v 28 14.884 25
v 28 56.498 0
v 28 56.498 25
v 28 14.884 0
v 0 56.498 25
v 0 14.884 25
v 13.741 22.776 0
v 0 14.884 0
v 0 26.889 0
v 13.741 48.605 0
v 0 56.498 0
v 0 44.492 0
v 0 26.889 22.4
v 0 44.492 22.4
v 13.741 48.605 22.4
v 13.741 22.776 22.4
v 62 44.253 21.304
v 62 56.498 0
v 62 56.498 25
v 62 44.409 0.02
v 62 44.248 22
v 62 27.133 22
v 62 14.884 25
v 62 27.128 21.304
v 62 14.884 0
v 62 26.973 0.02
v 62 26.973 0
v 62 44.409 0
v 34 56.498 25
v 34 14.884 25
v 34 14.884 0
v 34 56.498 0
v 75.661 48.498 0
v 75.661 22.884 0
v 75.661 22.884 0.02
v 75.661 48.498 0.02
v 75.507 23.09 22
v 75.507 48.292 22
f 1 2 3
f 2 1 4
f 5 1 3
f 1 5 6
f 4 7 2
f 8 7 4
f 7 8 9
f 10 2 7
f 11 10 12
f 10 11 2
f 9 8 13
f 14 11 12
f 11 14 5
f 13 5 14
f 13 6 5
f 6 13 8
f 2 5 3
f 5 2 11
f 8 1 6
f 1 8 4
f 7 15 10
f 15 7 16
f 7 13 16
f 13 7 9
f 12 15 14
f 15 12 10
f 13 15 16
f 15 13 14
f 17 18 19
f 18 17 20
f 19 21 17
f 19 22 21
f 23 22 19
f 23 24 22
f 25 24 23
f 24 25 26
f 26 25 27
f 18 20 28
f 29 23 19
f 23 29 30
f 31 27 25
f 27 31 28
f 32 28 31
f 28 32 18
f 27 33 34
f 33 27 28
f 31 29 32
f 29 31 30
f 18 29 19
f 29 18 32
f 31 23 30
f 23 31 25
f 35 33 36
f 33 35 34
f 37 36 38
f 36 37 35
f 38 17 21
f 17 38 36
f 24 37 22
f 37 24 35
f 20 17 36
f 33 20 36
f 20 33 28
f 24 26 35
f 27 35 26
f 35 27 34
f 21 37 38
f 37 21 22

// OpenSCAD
// GENERATED by make-makerworld.sh — do not edit, edit the lib/ sources.
// Single-file variant for the MakerWorld Parametric Model Maker.
// Parametric ornate picture frame, segmented for small-bed 3D printing.
//
// The frame is generated around a frameless canvas painting, split into
// one-piece L corners plus straight segments that each fit the selected
// printer bed, joined by glueless press-fit dovetails. The canvas sits fully
// recessed; printed clips hold it and carry the frame off the stretcher.
//
// Print orientation (all parts): decorative face UP, back plane on the bed.
// Suggested slicing: 0.6 mm nozzle, 2 walls, lightning infill, no supports.
//
// Workflow: print fit_test first, tune dovetail_clearance/shrinkage_compensation,
// then export all parts with export-all.sh.

/* [Painting] */
// Painting width (mm)
painting_width = 1300;        // [100:5:3000]
// Painting height (mm)
painting_height = 900;        // [100:5:3000]
// Painting/stretcher thickness (mm)
painting_thickness = 20;      // [5:1:60]
// Slack per side around the canvas (mm) — covers PLA shrinkage over long spans
fit_clearance = 4;            // [0:0.5:10]
// Front lip overlapping the painting face (mm)
lip_overlap = 10;             // [4:1:30]

/* [Frame look] */
// Cross-section style
profile_style = "ogee";       // [ogee, reverse_ogee, ripple]
// Moulding scale, proportional to painting size (1.0 = 5.4% of diagonal)
frame_scale = 1.0;            // [0.5:0.05:2.0]
// Generate relief ornament on the bands
ornament_enable = true;
// Ornament relief height (mm)
ornament_depth = 1.6;         // [0.6:0.2:3]
// Target ornament repeat period (mm)
ornament_period_target = 42;  // [24:2:80]
// Preview color of the frame body (previews only, not exported)
body_color = "#43280f";
// Preview color of the ornament relief (previews only, not exported)
ornament_color = "#d4a843";

/* [Printer / segmentation] */
// Bed preset
printer = "A1 Mini";          // [A1 Mini, A1, P1 X1, H2D]
// Keep-out margin per bed side (mm)
bed_margin = 2.5;             // [0:0.5:10]
// Dovetail clearance per side (mm) — press fit; tune with fit_test
dovetail_clearance = 0.08;    // [0:0.02:0.5]
// Dovetail flank taper (deg) — wedge-locks the glueless joint
dovetail_taper = 0.4;         // [0:0.1:2]
// Uniform XY scale on exported parts (1.003 = +0.3% shrink compensation)
shrinkage_compensation = 1.0; // [0.99:0.001:1.02]

/* [Output] */
render_mode = "fit_test";    // [assembled, exploded, part, fit_test, clips, bom]
// Which kind of part to export (render_mode=part)
part_kind = "straight";       // [straight, corner]
// Leg; a corner is the one at this leg's CCW start: bottom=BL, right=BR, top=TR, left=TL
part_leg = "bottom";          // [bottom, right, top, left]
// Straight segment number along the leg (CCW direction)
part_index = 1;               // [1:1:12]
// Gap between parts in exploded view (mm)
explode_gap = 30;             // [0:5:100]
// Restrict assembled output to one material group (for colored GLB/3MF export)
export_group = "all";         // [all, body, ornament]

/* [Mounting] */
// Canvas recess behind the back plane (mm); also the rabbet depth minus canvas
rabbet_extra = 4;             // [2:1:10]
// Keyhole wall hangers in the two top corners (normally the frame hangs on the stretcher)
hanger_keyholes = false;

/* [Hidden] */
$fa = 5;
$fs = 0.5;          // coarsest acceptable for a 0.4 mm nozzle; we print 0.6
curve_step = 0.8;   // profile sampling step (mm)
orn_embed = 0.6;    // how deep ornament sinks into the band surface (mm)
label_depth = 0.8;  // part ID engraving depth in the back (mm)

// ---- derived dimensions (all mm) ----
sight_w = painting_width - 2 * lip_overlap;
sight_h = painting_height - 2 * lip_overlap;
lip_w = lip_overlap + fit_clearance;
face_w = 0.054 * norm([painting_width, painting_height]) * frame_scale;
rabbet_depth = painting_thickness + rabbet_extra;
profile_h = max(0.45 * face_w, rabbet_depth + 12);
frame_ow = sight_w + 2 * face_w;
frame_oh = sight_h + 2 * face_w;

bed = printer == "A1 Mini" ? [180, 180] :
      printer == "A1"      ? [256, 256] :
      printer == "P1 X1"   ? [256, 256] :
      printer == "H2D"     ? [350, 320] :
      assert(false, str("unknown printer: ", printer)) [0, 0];
usable = min(bed[0], bed[1]) - 2 * bed_margin;

// ---- inlined from lib/profiles.scad ----
// lib/profiles.scad — cross-section (Querschnitt) generators
//
// Coordinates: u = distance from the sight (inner) edge, z = height above the
// back plane. Curves are defined as control point lists [u_frac, z_frac, shape]
// where u_frac is a fraction of face_w, z_frac a fraction of profile_h, and
// shape describes the segment ENDING at that point: 0 = straight line,
// 1 = cosine ease (smooth blend). All slopes stay <= ~50 deg from horizontal so
// the decorative face prints face-up without supports.

function _ease(t) = (1 - cos(180 * t)) / 2;

function prof_curve(style) =
  style == "ogee" ? [
    // sight fillet, inner scallop band, deep cove, grand ogee rise,
    // wide scroll band, groove, outer bead, outer fall
    [0.00, 0.80, 0],
    [0.04, 0.84, 1],
    [0.17, 0.84, 0],
    [0.26, 0.60, 1],
    [0.54, 0.97, 1],
    [0.80, 0.97, 0],
    [0.83, 0.89, 1],
    [0.87, 0.96, 1],
    [0.91, 0.87, 1],
    [1.00, 0.75, 1],
  ] :
  style == "reverse_ogee" ? [
    // high inner crest with band, grand fall outward, low outer scroll band,
    // outer bead
    [0.00, 0.80, 0],
    [0.06, 0.94, 1],
    [0.20, 0.94, 0],
    [0.46, 0.60, 1],
    [0.60, 0.66, 1],
    [0.84, 0.66, 0],
    [0.88, 0.74, 1],
    [0.93, 0.62, 1],
    [1.00, 0.55, 1],
  ] :
  style == "ripple" ? [
    // inner band, three rising ripples (Wellenleiste), outer scroll band, bead
    [0.00, 0.80, 0],
    [0.04, 0.86, 1],
    [0.15, 0.86, 0],
    [0.22, 0.76, 1],
    [0.29, 0.88, 1],
    [0.36, 0.78, 1],
    [0.43, 0.90, 1],
    [0.50, 0.80, 1],
    [0.57, 0.92, 1],
    [0.63, 0.97, 1],
    [0.84, 0.97, 0],
    [0.88, 0.88, 1],
    [0.92, 0.94, 1],
    [1.00, 0.72, 1],
  ] :
  assert(false, str("unknown profile_style: ", style)) [];

// Ornament bands per style: [u_frac_start, u_frac_end, z_frac_surface, kind]
// kind: 0 = running scroll (wide band), 1 = scallop/egg-and-dart (narrow band)
function prof_bands(style) =
  style == "ogee"         ? [[0.54, 0.80, 0.97, 0], [0.04, 0.17, 0.84, 1]] :
  style == "reverse_ogee" ? [[0.60, 0.84, 0.66, 0], [0.06, 0.20, 0.94, 1]] :
                            [[0.63, 0.84, 0.97, 0], [0.04, 0.15, 0.86, 1]];

function _segz(C, s, t) =
  let(z1 = C[s][1], z2 = C[s + 1][1], ty = C[s + 1][2])
  z1 + (z2 - z1) * (ty == 0 ? t : _ease(t));

// z_frac of the top surface at u_frac (clamped to [0,1])
function prof_z(C, uf) =
  let(cl = min(max(uf, 0), 1),
      s = [for (i = [0:len(C) - 2]) if (cl >= C[i][0] && cl <= C[i + 1][0]) i][0],
      t = (cl - C[s][0]) / max(C[s + 1][0] - C[s][0], 1e-9))
  _segz(C, s, t);

// minimum z_frac over [uf1, uf2]
function prof_min_z(C, uf1, uf2, n = 48) =
  min([for (i = [0:n]) prof_z(C, uf1 + (uf2 - uf1) * i / n)]);

// Full closed cross-section polygon in leg-local coordinates:
// x = y_local = face_w - u (outer edge at 0, sight edge at face_w), y = z.
// Includes the rear rabbet notch under the lip.
function leg_xsec_pts(C, fw, H, lipw, rd, step) =
  let(top = [for (s = [0:len(C) - 2]) each
              let(u1 = C[s][0], u2 = C[s + 1][0],
                  n = max(2, ceil((u2 - u1) * fw / step)))
              [for (j = [(s == 0 ? 0 : 1):n])
                let(t = j / n, uf = u1 + (u2 - u1) * t)
                [fw - uf * fw, H * _segz(C, s, t)]]])
  concat([[fw, rd]], top, [[0, 0], [fw - lipw, 0], [fw - lipw, rd]]);

// ---- inlined from lib/segmentation.scad ----
// lib/segmentation.scad — bed-aware cutting math + press-fit dovetail joints
//
// A leg runs along local +X over [0, L]; cut positions are leg-local X values.
// The ornament repeat grid and the cut grid share the same period so every seam
// lands on a motif boundary (pattern valley).

// Even number of ornament periods across the leg, symmetric about its center.
function grid_period(L, target) = L / (2 * max(1, round(L / (2 * target))));

// Cut positions for one leg: [arm_cut_low, internal cuts..., arm_cut_high].
// Corner arms (leg ends outside the outermost cuts) stay attached to the
// one-piece L corners. All cuts are multiples of the ornament period p,
// measured from the leg center. Every straight segment is <= usable.
function cuts_for(L, p, usable) =
  let(target_arm = 0.97 * usable,
      k = ceil((L / 2 - target_arm) / p))
  assert(k >= 1, str("Leg of ", L, " mm fits the bed — segmentation not needed; shrink corner arms or print whole"))
  let(cc = k * p,           // half-run length (distance of arm cuts from center)
      np = 2 * k,           // ornament periods inside the straight run
      mmax = max(1, floor(usable / p)),
      nseg = ceil(np / mmax),
      base = floor(np / nseg),
      extra = np - base * nseg,
      counts = [for (i = [0:nseg - 1])
                 (i < ceil(extra / 2) || i >= nseg - floor(extra / 2)) ? base + 1 : base])
  assert(max(counts) * p <= usable + 1e-6, "internal: segment exceeds bed")
  [for (j = [0:nseg]) L / 2 - cc + p * _psum(counts, j)];

function _psum(v, j) = j <= 0 ? 0 : _psum(v, j - 1) + v[j - 1];

// ---- Dovetail (plan-view trapezoid, vertical drop-in assembly) ----
// The male tenon belongs to the segment on the LOW-x side of a cut and points
// +x into the neighbor's pocket. Assembly: lay parts face-down, drop the tenon
// into the pocket (opening on the back face) and press — the tapered flanks
// wedge-lock. Print orientation: face up; the pocket roof is a small bridge.

function dt_poly(xc) = [
  [xc - 0.6, dt_yc - dt_wn / 2],
  [xc + dt_dl, dt_yc - dt_wh / 2],
  [xc + dt_dl, dt_yc + dt_wh / 2],
  [xc - 0.6, dt_yc + dt_wn / 2],
];

module dt_tenon(xc) {
  hull() {
    linear_extrude(0.02) polygon(dt_poly(xc));
    translate([0, 0, dt_h - 0.02])
      linear_extrude(0.02) offset(delta = -dt_taper_off) polygon(dt_poly(xc));
  }
}

module dt_pocket(xc) {
  color(body_color)  // preview only: difference faces show the subtrahend color
    translate([0, 0, -0.5])
      linear_extrude(dt_h + 0.9, convexity = 4)
        offset(delta = dovetail_clearance) polygon(dt_poly(xc));
}

// ---- inlined from lib/ornament.scad ----
// lib/ornament.scad — mathematically generated relief ornament
//
// Two band motifs, both emitted as single valid polygons (no self-intersection):
//  * running scroll: squashed Archimedean-style spiral r = R*(th/thmax)^k,
//    stroked with a tapering width, alternately rotated 180 deg (Vitruvian wave)
//  * scallop: half-annulus arc + central dart (egg-and-dart flavor)
// Relief height is ornament_depth; minimum stroke width stays >= 1.35 mm so a
// 0.6 mm nozzle (and 0.4 mm for compatibility) can print every ridge.

function _unit(v) = v / max(norm(v), 1e-9);

// stroke a polyline into a closed polygon, width lerping w0 -> w1 along it
function stroke_poly(pts, w0, w1) =
  let(n = len(pts) - 1,
      ts = [for (i = [0:n]) _unit(pts[min(i + 1, n)] - pts[max(i - 1, 0)])],
      ws = [for (i = [0:n]) w0 + (w1 - w0) * i / n],
      lft = [for (i = [0:n]) pts[i] + [-ts[i][1], ts[i][0]] * ws[i] / 2],
      rgt = [for (i = [0:n]) pts[i] - [-ts[i][1], ts[i][0]] * ws[i] / 2])
  concat(lft, [for (i = [n:-1:0]) rgt[i]]);

// spiral polyline from the outer end (theta=thmax) inward to theta=th0
function spiral_pts(R, sy, th0, thmax, kexp, step) =
  [for (th = [thmax:-step:th0])
    let(r = R * pow(th / thmax, kexp)) [r * cos(th), r * sin(th) * sy]];

scroll_w_out = 2.3;  // outer stroke width, mm
scroll_w_in = 1.35;  // stroke width at the spiral tip, mm

// 2D running-scroll motif centered on the origin, one ornament period wide
module scroll_motif(p, bw) {
  R = 0.40 * p;
  sy = min(0.62, (bw / 2 - scroll_w_out / 2 - 0.6) / R);
  pts = spiral_pts(R, sy, 90, 1080, 0.85, 12);
  tip = pts[len(pts) - 1];
  intersection() {
    union() {
      polygon(stroke_poly(pts, scroll_w_out, scroll_w_in));
      translate(tip) circle(d = scroll_w_in * 1.4);
      circle(d = 2.2);  // spiral eye
    }
    square([p - 1.0, bw - 0.4], center = true);
  }
}

// 2D scallop motif: half-annulus + dart, base sitting on the band's inner side
module scallop_motif(p2, bw) {
  R = min(0.44 * p2, 0.85 * bw);
  t = 1.6;
  intersection() {
    translate([0, -bw / 2 + 0.3]) union() {
      polygon(concat(
        [for (a = [0:7.5:180]) R * [cos(a), sin(a)]],
        [for (a = [180:-7.5:0]) (R - t) * [cos(a), sin(a)]]));
      polygon([[-1.0, 0], [1.0, 0], [0, max(R - t - 0.8, 2)]]);
    }
    square([p2 - 0.8, bw - 0.4], center = true);
  }
}

// extruded, cache-friendly motif (identical instances hit the geometry cache)
module motif3d(kind, p, bw) {
  render(convexity = 6)
    linear_extrude(orn_embed + ornament_depth, convexity = 6) {
      if (kind == 0) scroll_motif(p, bw);
      else scallop_motif(p, bw);
    }
}

// all ornament bands along one leg (leg-local coordinates), restricted to
// cells overlapping [x1, x2] — parts only build their own motifs, which keeps
// non-Manifold backends (MakerWorld) within usable render times
module ornament_leg(L, p, x1, x2) {
  n = round(L / p);
  for (b = prof_bands(profile_style)) {
    ybc = face_w - (b[0] + b[1]) / 2 * face_w;
    bw = (b[1] - b[0]) * face_w;
    zb = b[2] * profile_h - orn_embed;
    if (b[3] == 0) {
      for (i = [0:n - 1])
        if ((i + 1) * p >= x1 && i * p <= x2)
          translate([(i + 0.5) * p, ybc, zb])
            rotate([0, 0, i % 2 == 0 ? 0 : 180]) motif3d(0, p, bw);
    } else {
      for (i = [0:2 * n - 1])
        if ((i + 1) * p / 2 >= x1 && i * p / 2 <= x2)
          translate([(i + 0.5) * p / 2, ybc, zb]) motif3d(1, p / 2, bw);
    }
  }
}

// ---- inlined from lib/clips.scad ----
// lib/clips.scad — canvas retainer clips + their cavities in the frame back
//
// The canvas sits fully recessed in the rabbet pocket; its back face lies
// rabbet_extra mm in front of the frame's back plane. Each clip lies in a
// clip_pocket_d deep recess in the back plane (so clip + M3 screw head end up
// sub-flush — the back stays wall-flush) and its raised nose presses the
// stretcher. Load path: frame -> clips -> stretcher -> existing wall screws.
// Print orientation: flat on its back, nose step up. No supports.

clip_w = 12;          // clip width, mm
clip_t = 3;           // clip bar thickness, mm
clip_tail = 14;       // screw-side tail length, mm
clip_body = 8;        // body between hole and pocket wall, mm
clip_nose = 8;        // nose overlap onto the stretcher, mm
clip_pocket_d = 3.5;  // recess depth in the frame back, mm
clip_pocket_w = clip_w + 2;
clip_pocket_len = clip_tail + clip_body;
clip_hole_d = 3.4;    // M3 through-hole in the clip, mm
clip_pilot_d = 2.7;   // M3 self-tap pilot in the frame, mm

// standalone clip part, printed flat (z=0 on the bed)
module clip() {
  nose_rise = rabbet_extra - clip_pocket_d;
  assert(nose_rise >= 0, "rabbet_extra must be >= clip_pocket_d");
  difference() {
    union() {
      cube([clip_pocket_len, clip_w, clip_t]);
      translate([clip_pocket_len - 0.1, 0, nose_rise])
        cube([clip_nose + 0.1, clip_w, clip_t]);
    }
    translate([clip_tail / 2, clip_w / 2, -1])
      cylinder(d = clip_hole_d, h = clip_t + rabbet_extra + 2);
  }
}

// recess + pilot hole, subtracted from a leg at leg-local x
module clip_cavity(x) color(body_color) {
  y1 = face_w - lip_w - clip_pocket_len;
  translate([x - clip_pocket_w / 2, y1, -0.1])
    cube([clip_pocket_w, clip_pocket_len + 2, clip_pocket_d + 0.1]);
  translate([x, y1 + clip_tail / 2, -1])
    cylinder(d = clip_pilot_d, h = clip_pocket_d + 11);
}

// all clips as one print plate
module clips_plate(n) {
  cols = 2;
  for (i = [0:n - 1])
    translate([(i % cols) * (clip_pocket_len + clip_nose + 8), floor(i / cols) * (clip_w + 5), 0])
      clip();
}


PC = prof_curve(profile_style);

// dovetail geometry, centered on the solid body between rabbet wall and outer edge
dt_yc = (face_w - lip_w) / 2;
dt_wn = 0.20 * face_w;
dt_wh = 0.30 * face_w;
dt_dl = 0.16 * face_w;
dt_h = min(rabbet_depth - 2,
           profile_h * prof_min_z(PC,
             (face_w - (dt_yc + dt_wh / 2 + 2)) / face_w,
             (face_w - (dt_yc - dt_wh / 2 - 2)) / face_w) - 2.9);
dt_taper_off = tan(dovetail_taper) * dt_h;

// segmentation grids (horizontal legs: bottom/top; vertical legs: left/right).
// Every part carries its male tenon dt_dl beyond the cut — the FULL part
// including the tenon must fit the bed, so the segment budget shrinks by dt_dl.
usable_part = usable - dt_dl;
p_h = grid_period(frame_ow, ornament_period_target);
p_v = grid_period(frame_oh, ornament_period_target);
cuts_h = cuts_for(frame_ow, p_h, usable_part);
cuts_v = cuts_for(frame_oh, p_v, usable_part);
nseg_h = len(cuts_h) - 1;
nseg_v = len(cuts_v) - 1;
arm_h = cuts_h[0];
arm_v = cuts_v[0];

// ---- sanity checks ----
assert(face_w <= usable, "moulding wider than the printer bed — reduce frame_scale");
assert(profile_h * prof_min_z(PC, 0, lip_w / face_w) >= rabbet_depth + 5,
       "lip too thin over the rabbet — raise frame_scale or lower rabbet_extra");
assert(dt_h >= 8, "dovetail too shallow — raise frame_scale");
// bed-fit including the protruding tenon (a part's true bounding box)
assert(max([for (i = [1:nseg_h]) cuts_h[i] - cuts_h[i - 1]]) + dt_dl <= usable,
       "segment + tenon exceeds bed");
assert(max([for (i = [1:nseg_v]) cuts_v[i] - cuts_v[i - 1]]) + dt_dl <= usable,
       "segment + tenon exceeds bed");
assert(max(arm_h, arm_v) + dt_dl <= usable, "corner + tenon exceeds bed");
assert(scroll_w_in >= 1.3, "ornament stroke below printable width");
assert(part_index >= 1, "part_index starts at 1");

// ---- leg helpers ----
LEGS = ["b", "r", "t", "l"];
function prev_leg(leg) = leg == "b" ? "l" : leg == "r" ? "b" : leg == "t" ? "r" : "t";
function leg_letter(leg) = leg == "b" ? "B" : leg == "r" ? "R" : leg == "t" ? "T" : "L";
function corner_code(leg) = leg == "b" ? "BL" : leg == "r" ? "BR" : leg == "t" ? "TR" : "TL";
function leg_horiz(leg) = leg == "b" || leg == "t";
function legL(leg) = leg_horiz(leg) ? frame_ow : frame_oh;
function leg_p(leg) = leg_horiz(leg) ? p_h : p_v;
function leg_cuts(leg) = leg_horiz(leg) ? cuts_h : cuts_v;
function leg_nseg(leg) = leg_horiz(leg) ? nseg_h : nseg_v;
// clips sit at the centers of the odd straight segments (1, 3, 5, ...)
function clip_xs(leg) = let(cs = leg_cuts(leg))
  [for (i = [0:2:len(cs) - 2]) (cs[i] + cs[i + 1]) / 2];
n_clips = 2 * len(clip_xs("b")) + 2 * len(clip_xs("r"));

// leg-local -> global point mapping (matches leg_xform)
function leg_pt(leg, x, y) =
  leg == "b" ? [-frame_ow / 2 + x, -frame_oh / 2 + y] :
  leg == "r" ? [frame_ow / 2 - y, -frame_oh / 2 + x] :
  leg == "t" ? [frame_ow / 2 - x, frame_oh / 2 - y] :
               [-frame_ow / 2 + y, frame_oh / 2 - x];

function corner_center(leg) =
  leg == "b" ? [-frame_ow / 2 + arm_h / 2, -frame_oh / 2 + arm_v / 2] :
  leg == "r" ? [frame_ow / 2 - arm_h / 2, -frame_oh / 2 + arm_v / 2] :
  leg == "t" ? [frame_ow / 2 - arm_h / 2, frame_oh / 2 - arm_v / 2] :
               [-frame_ow / 2 + arm_h / 2, frame_oh / 2 - arm_v / 2];

function _unit2(v) = norm(v) < 1e-9 ? [1, 0] : v / norm(v);

module leg_xform(leg) {
  if (leg == "b") translate([-frame_ow / 2, -frame_oh / 2, 0]) children();
  else if (leg == "r") translate([frame_ow / 2, -frame_oh / 2, 0]) rotate([0, 0, 90]) children();
  else if (leg == "t") translate([frame_ow / 2, frame_oh / 2, 0]) rotate([0, 0, 180]) children();
  else translate([-frame_ow / 2, frame_oh / 2, 0]) rotate([0, 0, 270]) children();
}

// ---- leg geometry (leg-local: runs +X over [0,L], outer edge at y=0) ----
module leg_body(L) {
  rotate([90, 0, 90])
    linear_extrude(L, convexity = 10)
      polygon(leg_xsec_pts(PC, face_w, profile_h, lip_w, rabbet_depth, curve_step));
}

function wedge_pts(L) = [[0, 0], [L, 0], [L - face_w, face_w], [face_w, face_w]];

module leg_wedge(L) {
  linear_extrude(profile_h + ornament_depth + 2, convexity = 10)
    polygon(wedge_pts(L));
}

// full decorated leg: mitered ends, ornament, dovetail pockets, clip cavities.
// Body and ornament are separate colored solids so previews show the relief
// with contrast; exports union them into one mesh.
// x1/x2 restrict which motifs, pockets and cavities get built — pass the mask
// range when building a single part so render cost scales with the part, not
// the whole 1.45 m leg (x2 < 0 means full leg)
module leg_local(leg, x1 = 0, x2 = -1) {
  L = legL(leg);
  xe = x2 < 0 ? L : x2;
  if (export_group != "ornament")
    color(body_color) render(convexity = 10)
      difference() {
        intersection() {
          leg_body(L);
          leg_wedge(L);
        }
        for (xc = leg_cuts(leg))
          if (xc >= x1 - dt_dl - 1 && xc <= xe + dt_dl + 1) dt_pocket(xc);
        for (x = clip_xs(leg))
          if (x >= x1 - 20 && x <= xe + 20) clip_cavity(x);
      }
  if (ornament_enable && export_group != "body")
    color(ornament_color) render(convexity = 10)
      intersection() {
        ornament_leg(L, leg_p(leg), x1, xe);
        leg_wedge(L);
      }
}

// colored so intersection cut faces preview in body color, not the theme default
module mask_slab(x1, x2) {
  color(body_color)
    translate([x1, -5, -5])
      cube([x2 - x1, face_w + 10, profile_h + ornament_depth + 12]);
}

// engraved part ID, readable from the back (subtracted; positioned by caller)
module part_label(txt) {
  color(body_color)
  translate([0, 0, -0.1])
    linear_extrude(label_depth + 0.1)
      mirror([1, 0, 0]) text(txt, size = 7, halign = "center", valign = "center");
}

// keyhole hanger, carved from the back; slot toward local -y (= global up on the top leg)
module keyhole() {
  translate([0, 0, -0.1]) cylinder(d = 9, h = 4.1);
  hull() {
    translate([0, 0, -0.1]) cylinder(d = 4.5, h = 4.1);
    translate([0, -12, -0.1]) cylinder(d = 4.5, h = 4.1);
  }
  translate([0, 0, 2.2]) hull() {
    cylinder(d = 8, h = 1.9);
    translate([0, -12, 0]) cylinder(d = 8, h = 1.9);
  }
}

// ---- parts ----
// straight segment i (1-based), leg-local coordinates, back on z=0
module part_straight_inplace(leg, i) {
  cs = leg_cuts(leg);
  assert(i <= len(cs) - 1, str("part_index > ", len(cs) - 1, " for this leg"));
  x1 = cs[i - 1];
  x2 = cs[i];
  difference() {
    union() {
      intersection() {
        leg_local(leg, x1, x2);
        mask_slab(x1, x2);
      }
      color(body_color) dt_tenon(x2);
    }
    translate([(x1 + x2) / 2, dt_yc, 0]) part_label(str(leg_letter(leg), i));
  }
}

// one-piece L corner at the CCW start of `leg`, global coordinates
module part_corner_inplace(leg) {
  pl = prev_leg(leg);
  c0 = leg_cuts(leg)[0];
  cN = leg_cuts(pl)[leg_nseg(pl)];
  difference() {
    union() {
      leg_xform(pl)
        intersection() {
          leg_local(pl, cN, legL(pl));
          mask_slab(cN, legL(pl) + 1);
        }
      leg_xform(leg) {
        intersection() {
          leg_local(leg, 0, c0);
          mask_slab(-1, c0);
        }
        color(body_color) dt_tenon(c0);
      }
    }
    leg_xform(leg) translate([c0 * 0.45, dt_yc, 0]) part_label(corner_code(leg));
    if (hanger_keyholes && leg == "t")
      leg_xform("t") translate([28, 16, 0]) keyhole();
    if (hanger_keyholes && leg == "l")
      leg_xform("t") translate([legL("t") - 28, 16, 0]) keyhole();
  }
}

// ---- top-level modes ----
module frame_assembled() {
  for (leg = LEGS) {
    leg_xform(leg) leg_local(leg);
    if (export_group != "ornament")
      for (xc = leg_cuts(leg)) leg_xform(leg) color(body_color) dt_tenon(xc);
  }
}

module frame_exploded() {
  for (leg = LEGS) {
    translate(1.5 * explode_gap * _unit2(corner_center(leg)))
      part_corner_inplace(leg);
    cs = leg_cuts(leg);
    for (i = [1:len(cs) - 1])
      translate(explode_gap * _unit2(leg_pt(leg, (cs[i - 1] + cs[i]) / 2, face_w / 2)))
        leg_xform(leg) part_straight_inplace(leg, i);
  }
}

// dovetail fit-test coupon: one female block, one male block. Print both face
// up as-is, then press together face-down like the real segments.
module fit_test() {
  bw2 = dt_wh + 16;
  difference() {
    translate([0, dt_yc - bw2 / 2, 0]) cube([28, bw2, dt_h + 3]);
    dt_pocket(0);
  }
  translate([34, 0, 0]) {
    translate([0, dt_yc - bw2 / 2, 0]) cube([28, bw2, dt_h + 3]);
    dt_tenon(28);
  }
}

module painting_ghost() {
  %translate([-painting_width / 2, -painting_height / 2, rabbet_depth - painting_thickness])
    cube([painting_width, painting_height, painting_thickness]);
}

function part_leg_code() =
  part_leg == "bottom" ? "b" : part_leg == "right" ? "r" : part_leg == "top" ? "t" : "l";

if (render_mode == "assembled") {
  frame_assembled();
  painting_ghost();
} else if (render_mode == "exploded") {
  frame_exploded();
} else if (render_mode == "part") {
  scale([shrinkage_compensation, shrinkage_compensation, 1]) {
    if (part_kind == "corner") {
      cc = corner_center(part_leg_code());
      translate([-cc[0], -cc[1], 0]) part_corner_inplace(part_leg_code());
    } else {
      leg = part_leg_code();
      cs = leg_cuts(leg);
      translate([-(cs[part_index - 1] + cs[part_index]) / 2, -face_w / 2, 0])
        part_straight_inplace(leg, part_index);
    }
  }
} else if (render_mode == "fit_test") {
  color(body_color) scale([shrinkage_compensation, shrinkage_compensation, 1]) fit_test();
} else if (render_mode == "clips") {
  color(body_color) clips_plate(n_clips);
}
// render_mode == "bom": geometry-free, echo output below is the product

// ---- BOM / machine-readable info ----
echo(str("COUNTS ", nseg_h, " ", nseg_v));
echo(str("FRAME outer ", frame_ow, " x ", frame_oh, " mm, moulding ", face_w,
         " wide x ", profile_h, " high, opening for painting ",
         painting_width + 2 * fit_clearance, " x ", painting_height + 2 * fit_clearance));
echo(str("SEGMENTS bottom/top: ", nseg_h, " x ",
         [for (i = [1:nseg_h]) cuts_h[i] - cuts_h[i - 1]],
         " mm, left/right: ", nseg_v, " x ",
         [for (i = [1:nseg_v]) cuts_v[i] - cuts_v[i - 1]], " mm"));
echo(str("CORNER arms ", arm_h, " x ", arm_v, " mm (4 corners)"));
echo(str("PARTS total ", 4 + 2 * nseg_h + 2 * nseg_v, " frame pieces + ",
         n_clips, " clips; hardware: ", n_clips, " x M3x8 screws"));
echo(str("DOVETAIL neck ", dt_wn, " head ", dt_wh, " length ", dt_dl,
         " height ", dt_h, " clearance ", dovetail_clearance, " taper ", dovetail_taper, " deg"));
